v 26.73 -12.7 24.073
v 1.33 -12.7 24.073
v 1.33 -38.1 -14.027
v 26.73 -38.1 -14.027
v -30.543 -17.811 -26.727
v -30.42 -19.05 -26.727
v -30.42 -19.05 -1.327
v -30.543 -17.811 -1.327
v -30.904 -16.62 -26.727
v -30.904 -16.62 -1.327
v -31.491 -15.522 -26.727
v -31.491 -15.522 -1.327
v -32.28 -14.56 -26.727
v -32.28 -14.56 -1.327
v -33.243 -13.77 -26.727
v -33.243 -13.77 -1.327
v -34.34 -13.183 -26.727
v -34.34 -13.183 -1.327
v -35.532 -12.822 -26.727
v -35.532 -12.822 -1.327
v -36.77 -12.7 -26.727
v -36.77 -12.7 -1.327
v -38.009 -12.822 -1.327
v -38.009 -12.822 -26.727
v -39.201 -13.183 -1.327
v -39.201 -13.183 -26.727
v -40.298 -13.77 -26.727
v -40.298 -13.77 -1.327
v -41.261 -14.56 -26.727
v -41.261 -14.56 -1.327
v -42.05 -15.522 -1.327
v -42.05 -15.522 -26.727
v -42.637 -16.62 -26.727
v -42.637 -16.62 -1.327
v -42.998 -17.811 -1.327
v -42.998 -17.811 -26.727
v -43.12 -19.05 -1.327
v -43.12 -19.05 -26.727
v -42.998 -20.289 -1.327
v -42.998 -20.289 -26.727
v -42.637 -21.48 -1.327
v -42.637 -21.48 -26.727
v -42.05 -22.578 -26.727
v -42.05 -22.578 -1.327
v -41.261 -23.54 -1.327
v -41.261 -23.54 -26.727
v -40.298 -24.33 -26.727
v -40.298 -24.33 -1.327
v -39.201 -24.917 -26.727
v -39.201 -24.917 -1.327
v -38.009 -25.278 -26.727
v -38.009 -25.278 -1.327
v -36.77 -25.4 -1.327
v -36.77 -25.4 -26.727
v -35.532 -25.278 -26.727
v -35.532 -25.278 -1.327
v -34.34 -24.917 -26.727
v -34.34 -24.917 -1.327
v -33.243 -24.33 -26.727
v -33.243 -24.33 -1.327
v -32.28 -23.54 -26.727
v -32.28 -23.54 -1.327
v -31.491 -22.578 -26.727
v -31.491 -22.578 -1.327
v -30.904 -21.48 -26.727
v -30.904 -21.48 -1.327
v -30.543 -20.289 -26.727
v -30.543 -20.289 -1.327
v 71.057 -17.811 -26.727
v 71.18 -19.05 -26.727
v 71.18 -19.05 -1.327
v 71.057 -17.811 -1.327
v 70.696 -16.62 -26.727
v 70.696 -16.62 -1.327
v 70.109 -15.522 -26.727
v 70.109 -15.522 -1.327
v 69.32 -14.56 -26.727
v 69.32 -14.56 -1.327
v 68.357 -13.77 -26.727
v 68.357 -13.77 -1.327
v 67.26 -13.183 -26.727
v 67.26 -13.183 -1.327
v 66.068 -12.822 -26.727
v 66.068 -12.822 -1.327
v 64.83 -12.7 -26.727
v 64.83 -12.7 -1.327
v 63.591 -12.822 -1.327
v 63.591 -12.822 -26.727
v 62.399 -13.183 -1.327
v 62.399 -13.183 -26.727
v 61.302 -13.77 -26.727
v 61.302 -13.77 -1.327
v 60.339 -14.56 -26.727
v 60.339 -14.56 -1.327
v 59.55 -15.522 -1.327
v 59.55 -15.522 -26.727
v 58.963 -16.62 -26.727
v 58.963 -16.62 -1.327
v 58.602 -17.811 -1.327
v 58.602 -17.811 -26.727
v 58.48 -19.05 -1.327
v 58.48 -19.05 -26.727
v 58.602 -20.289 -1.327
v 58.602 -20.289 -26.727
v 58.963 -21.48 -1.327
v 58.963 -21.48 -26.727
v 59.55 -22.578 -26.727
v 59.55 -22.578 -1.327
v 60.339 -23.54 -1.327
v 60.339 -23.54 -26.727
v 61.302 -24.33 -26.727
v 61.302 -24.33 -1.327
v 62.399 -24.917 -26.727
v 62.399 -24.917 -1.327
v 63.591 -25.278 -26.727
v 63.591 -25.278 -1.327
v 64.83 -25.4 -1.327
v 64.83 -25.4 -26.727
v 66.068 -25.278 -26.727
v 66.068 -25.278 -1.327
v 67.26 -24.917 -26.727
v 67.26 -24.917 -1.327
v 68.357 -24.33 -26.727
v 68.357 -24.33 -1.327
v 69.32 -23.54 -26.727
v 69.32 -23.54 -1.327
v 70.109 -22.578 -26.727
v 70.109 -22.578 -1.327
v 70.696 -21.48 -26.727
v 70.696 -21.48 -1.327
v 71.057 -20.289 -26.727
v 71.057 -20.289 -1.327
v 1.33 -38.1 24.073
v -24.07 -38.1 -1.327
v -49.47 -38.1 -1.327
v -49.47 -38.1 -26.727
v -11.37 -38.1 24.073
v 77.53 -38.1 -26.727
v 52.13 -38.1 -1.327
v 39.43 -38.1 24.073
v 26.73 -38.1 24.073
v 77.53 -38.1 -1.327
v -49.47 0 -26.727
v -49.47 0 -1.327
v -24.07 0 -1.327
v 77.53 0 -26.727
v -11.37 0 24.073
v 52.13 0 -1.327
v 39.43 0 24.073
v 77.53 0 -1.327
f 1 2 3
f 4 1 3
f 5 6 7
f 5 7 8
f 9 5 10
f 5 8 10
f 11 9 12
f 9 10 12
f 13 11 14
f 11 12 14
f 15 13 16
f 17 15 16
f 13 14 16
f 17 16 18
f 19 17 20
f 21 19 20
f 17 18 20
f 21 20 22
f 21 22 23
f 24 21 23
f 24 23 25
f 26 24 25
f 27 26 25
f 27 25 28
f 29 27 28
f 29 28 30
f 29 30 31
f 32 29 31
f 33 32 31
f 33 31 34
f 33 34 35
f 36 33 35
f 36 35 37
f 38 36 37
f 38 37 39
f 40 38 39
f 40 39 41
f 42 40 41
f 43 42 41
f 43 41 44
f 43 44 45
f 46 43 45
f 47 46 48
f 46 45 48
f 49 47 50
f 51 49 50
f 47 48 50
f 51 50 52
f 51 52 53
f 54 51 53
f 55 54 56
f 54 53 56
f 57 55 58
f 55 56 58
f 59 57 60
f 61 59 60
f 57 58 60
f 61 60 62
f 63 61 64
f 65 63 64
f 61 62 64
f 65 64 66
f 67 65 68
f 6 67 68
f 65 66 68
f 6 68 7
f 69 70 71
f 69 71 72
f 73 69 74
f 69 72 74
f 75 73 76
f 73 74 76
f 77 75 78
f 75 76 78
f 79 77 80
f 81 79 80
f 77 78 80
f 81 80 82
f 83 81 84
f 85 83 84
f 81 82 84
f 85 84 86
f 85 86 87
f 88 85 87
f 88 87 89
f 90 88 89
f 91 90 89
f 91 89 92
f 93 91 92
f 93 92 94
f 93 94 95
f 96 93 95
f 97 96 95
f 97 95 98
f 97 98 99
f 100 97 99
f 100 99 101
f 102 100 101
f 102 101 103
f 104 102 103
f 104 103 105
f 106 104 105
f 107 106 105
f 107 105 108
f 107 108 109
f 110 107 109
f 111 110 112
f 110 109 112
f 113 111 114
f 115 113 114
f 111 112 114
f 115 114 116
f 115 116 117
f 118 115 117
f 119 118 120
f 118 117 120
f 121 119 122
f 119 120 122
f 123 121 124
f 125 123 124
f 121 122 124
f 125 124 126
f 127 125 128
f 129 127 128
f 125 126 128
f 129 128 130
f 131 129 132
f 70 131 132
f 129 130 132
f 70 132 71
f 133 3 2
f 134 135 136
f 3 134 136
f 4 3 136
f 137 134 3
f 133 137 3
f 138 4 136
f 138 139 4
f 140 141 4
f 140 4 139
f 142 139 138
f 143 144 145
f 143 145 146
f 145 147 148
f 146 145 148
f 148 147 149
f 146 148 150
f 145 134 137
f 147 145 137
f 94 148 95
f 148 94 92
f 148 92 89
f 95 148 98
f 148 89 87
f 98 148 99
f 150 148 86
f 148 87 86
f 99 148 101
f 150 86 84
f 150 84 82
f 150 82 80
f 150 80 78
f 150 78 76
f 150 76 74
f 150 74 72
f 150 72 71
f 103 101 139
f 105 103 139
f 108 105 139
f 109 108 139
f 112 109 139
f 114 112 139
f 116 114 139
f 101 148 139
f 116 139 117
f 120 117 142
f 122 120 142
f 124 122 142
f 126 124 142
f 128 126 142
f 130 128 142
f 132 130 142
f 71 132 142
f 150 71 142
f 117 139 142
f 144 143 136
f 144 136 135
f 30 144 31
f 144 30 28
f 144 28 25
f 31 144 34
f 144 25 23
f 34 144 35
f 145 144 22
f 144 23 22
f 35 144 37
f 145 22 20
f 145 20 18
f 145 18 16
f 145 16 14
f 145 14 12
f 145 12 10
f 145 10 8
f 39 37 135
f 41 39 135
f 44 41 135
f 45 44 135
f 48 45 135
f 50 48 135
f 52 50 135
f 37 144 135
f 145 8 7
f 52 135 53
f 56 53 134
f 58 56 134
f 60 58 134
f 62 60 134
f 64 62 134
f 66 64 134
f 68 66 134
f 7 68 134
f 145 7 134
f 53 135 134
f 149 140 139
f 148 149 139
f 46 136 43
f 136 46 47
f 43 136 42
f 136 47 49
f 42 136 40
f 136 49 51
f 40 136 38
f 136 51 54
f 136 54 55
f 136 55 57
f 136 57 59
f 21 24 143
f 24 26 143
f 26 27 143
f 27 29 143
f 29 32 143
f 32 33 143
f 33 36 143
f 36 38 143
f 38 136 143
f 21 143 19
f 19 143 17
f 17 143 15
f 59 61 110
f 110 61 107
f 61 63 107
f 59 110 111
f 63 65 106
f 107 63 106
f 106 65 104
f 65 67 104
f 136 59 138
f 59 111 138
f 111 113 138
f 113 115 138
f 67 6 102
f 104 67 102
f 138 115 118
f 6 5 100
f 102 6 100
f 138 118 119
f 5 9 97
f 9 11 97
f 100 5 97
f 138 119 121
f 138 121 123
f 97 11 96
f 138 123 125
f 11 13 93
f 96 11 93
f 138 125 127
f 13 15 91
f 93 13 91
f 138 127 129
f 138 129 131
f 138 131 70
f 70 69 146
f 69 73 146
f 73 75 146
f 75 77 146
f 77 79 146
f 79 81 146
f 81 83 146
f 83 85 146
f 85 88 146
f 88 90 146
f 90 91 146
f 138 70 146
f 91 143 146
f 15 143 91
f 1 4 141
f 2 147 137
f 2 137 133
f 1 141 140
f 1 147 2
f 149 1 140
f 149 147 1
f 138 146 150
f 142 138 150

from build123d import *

# Parameters (mm, degrees)
F0_W      = 127
F0_H      = 50.8
F1_DEPTH  = 38.1
F2_W      = 25.4
F2_H      = 25.4
F3_DEPTH  = 38.101
F5_DEPTH  = 38.101
F8_R      = 6.35
F7_R      = 6.35
F9_DEPTH  = 25.401
F6_W      = 25.4
F6_H      = 38.1
F10_DEPTH = 25.4
F12_DEPTH = 25.4


with BuildPart() as f1:
    # F0 (on Front) → F1 (new body)
    with BuildSketch(Plane.XZ):
        with Locations((14.029513, -1.326698)):
            Rectangle(F0_W, F0_H)
    extrude(amount=F1_DEPTH)

    # F2 (on face) → F3 (cut, through all)
    with BuildSketch(Plane.XZ.offset(38.1)):
        with Locations((-36.770487, 11.373302)):
            Rectangle(F2_W, F2_H)
        with Locations((64.829513, 11.373302)):
            Rectangle(F2_W, F2_H)
    extrude(amount=-F3_DEPTH, mode=Mode.SUBTRACT)

    # F4 (on face) → F5 (cut, through all)
    with BuildSketch(Plane.XZ.offset(38.1)):
        Polygon((-24.070487, 24.073302), (-24.070487, -1.326698), (-11.370487, 24.073302), align=None)
        Polygon((52.129513, 24.073302), (39.429513, 24.073302), (52.129513, -1.326698), align=None)
    extrude(amount=-F5_DEPTH, mode=Mode.SUBTRACT)

    # F8 (on face) + F7 (on face) → F9 (cut, through all)
    with BuildSketch(Plane.XY.offset(-1.326698)):
        with Locations((64.829513, -19.05)):
            Circle(F8_R)
    with BuildSketch(Plane.XY.offset(-1.326698)):
        with Locations((-36.770487, -19.05)):
            Circle(F7_R)
    extrude(amount=-F9_DEPTH, mode=Mode.SUBTRACT)

    # F6 (on face) → F10 (cut)
    with BuildSketch(Plane.XZ.offset(38.1)):
        with Locations((14.029513, 5.023302)):
            Rectangle(F6_W, F6_H)
    extrude(amount=-F10_DEPTH, mode=Mode.SUBTRACT)

    # F11 (on face) → F12 (join)
    with BuildSketch(Plane.YZ.offset(1.329513)):
        Polygon((-12.7, 24.073302), (-38.1, -14.026698), (-12.7, -14.026698), align=None)
    extrude(amount=F12_DEPTH)


solid = f1.part
